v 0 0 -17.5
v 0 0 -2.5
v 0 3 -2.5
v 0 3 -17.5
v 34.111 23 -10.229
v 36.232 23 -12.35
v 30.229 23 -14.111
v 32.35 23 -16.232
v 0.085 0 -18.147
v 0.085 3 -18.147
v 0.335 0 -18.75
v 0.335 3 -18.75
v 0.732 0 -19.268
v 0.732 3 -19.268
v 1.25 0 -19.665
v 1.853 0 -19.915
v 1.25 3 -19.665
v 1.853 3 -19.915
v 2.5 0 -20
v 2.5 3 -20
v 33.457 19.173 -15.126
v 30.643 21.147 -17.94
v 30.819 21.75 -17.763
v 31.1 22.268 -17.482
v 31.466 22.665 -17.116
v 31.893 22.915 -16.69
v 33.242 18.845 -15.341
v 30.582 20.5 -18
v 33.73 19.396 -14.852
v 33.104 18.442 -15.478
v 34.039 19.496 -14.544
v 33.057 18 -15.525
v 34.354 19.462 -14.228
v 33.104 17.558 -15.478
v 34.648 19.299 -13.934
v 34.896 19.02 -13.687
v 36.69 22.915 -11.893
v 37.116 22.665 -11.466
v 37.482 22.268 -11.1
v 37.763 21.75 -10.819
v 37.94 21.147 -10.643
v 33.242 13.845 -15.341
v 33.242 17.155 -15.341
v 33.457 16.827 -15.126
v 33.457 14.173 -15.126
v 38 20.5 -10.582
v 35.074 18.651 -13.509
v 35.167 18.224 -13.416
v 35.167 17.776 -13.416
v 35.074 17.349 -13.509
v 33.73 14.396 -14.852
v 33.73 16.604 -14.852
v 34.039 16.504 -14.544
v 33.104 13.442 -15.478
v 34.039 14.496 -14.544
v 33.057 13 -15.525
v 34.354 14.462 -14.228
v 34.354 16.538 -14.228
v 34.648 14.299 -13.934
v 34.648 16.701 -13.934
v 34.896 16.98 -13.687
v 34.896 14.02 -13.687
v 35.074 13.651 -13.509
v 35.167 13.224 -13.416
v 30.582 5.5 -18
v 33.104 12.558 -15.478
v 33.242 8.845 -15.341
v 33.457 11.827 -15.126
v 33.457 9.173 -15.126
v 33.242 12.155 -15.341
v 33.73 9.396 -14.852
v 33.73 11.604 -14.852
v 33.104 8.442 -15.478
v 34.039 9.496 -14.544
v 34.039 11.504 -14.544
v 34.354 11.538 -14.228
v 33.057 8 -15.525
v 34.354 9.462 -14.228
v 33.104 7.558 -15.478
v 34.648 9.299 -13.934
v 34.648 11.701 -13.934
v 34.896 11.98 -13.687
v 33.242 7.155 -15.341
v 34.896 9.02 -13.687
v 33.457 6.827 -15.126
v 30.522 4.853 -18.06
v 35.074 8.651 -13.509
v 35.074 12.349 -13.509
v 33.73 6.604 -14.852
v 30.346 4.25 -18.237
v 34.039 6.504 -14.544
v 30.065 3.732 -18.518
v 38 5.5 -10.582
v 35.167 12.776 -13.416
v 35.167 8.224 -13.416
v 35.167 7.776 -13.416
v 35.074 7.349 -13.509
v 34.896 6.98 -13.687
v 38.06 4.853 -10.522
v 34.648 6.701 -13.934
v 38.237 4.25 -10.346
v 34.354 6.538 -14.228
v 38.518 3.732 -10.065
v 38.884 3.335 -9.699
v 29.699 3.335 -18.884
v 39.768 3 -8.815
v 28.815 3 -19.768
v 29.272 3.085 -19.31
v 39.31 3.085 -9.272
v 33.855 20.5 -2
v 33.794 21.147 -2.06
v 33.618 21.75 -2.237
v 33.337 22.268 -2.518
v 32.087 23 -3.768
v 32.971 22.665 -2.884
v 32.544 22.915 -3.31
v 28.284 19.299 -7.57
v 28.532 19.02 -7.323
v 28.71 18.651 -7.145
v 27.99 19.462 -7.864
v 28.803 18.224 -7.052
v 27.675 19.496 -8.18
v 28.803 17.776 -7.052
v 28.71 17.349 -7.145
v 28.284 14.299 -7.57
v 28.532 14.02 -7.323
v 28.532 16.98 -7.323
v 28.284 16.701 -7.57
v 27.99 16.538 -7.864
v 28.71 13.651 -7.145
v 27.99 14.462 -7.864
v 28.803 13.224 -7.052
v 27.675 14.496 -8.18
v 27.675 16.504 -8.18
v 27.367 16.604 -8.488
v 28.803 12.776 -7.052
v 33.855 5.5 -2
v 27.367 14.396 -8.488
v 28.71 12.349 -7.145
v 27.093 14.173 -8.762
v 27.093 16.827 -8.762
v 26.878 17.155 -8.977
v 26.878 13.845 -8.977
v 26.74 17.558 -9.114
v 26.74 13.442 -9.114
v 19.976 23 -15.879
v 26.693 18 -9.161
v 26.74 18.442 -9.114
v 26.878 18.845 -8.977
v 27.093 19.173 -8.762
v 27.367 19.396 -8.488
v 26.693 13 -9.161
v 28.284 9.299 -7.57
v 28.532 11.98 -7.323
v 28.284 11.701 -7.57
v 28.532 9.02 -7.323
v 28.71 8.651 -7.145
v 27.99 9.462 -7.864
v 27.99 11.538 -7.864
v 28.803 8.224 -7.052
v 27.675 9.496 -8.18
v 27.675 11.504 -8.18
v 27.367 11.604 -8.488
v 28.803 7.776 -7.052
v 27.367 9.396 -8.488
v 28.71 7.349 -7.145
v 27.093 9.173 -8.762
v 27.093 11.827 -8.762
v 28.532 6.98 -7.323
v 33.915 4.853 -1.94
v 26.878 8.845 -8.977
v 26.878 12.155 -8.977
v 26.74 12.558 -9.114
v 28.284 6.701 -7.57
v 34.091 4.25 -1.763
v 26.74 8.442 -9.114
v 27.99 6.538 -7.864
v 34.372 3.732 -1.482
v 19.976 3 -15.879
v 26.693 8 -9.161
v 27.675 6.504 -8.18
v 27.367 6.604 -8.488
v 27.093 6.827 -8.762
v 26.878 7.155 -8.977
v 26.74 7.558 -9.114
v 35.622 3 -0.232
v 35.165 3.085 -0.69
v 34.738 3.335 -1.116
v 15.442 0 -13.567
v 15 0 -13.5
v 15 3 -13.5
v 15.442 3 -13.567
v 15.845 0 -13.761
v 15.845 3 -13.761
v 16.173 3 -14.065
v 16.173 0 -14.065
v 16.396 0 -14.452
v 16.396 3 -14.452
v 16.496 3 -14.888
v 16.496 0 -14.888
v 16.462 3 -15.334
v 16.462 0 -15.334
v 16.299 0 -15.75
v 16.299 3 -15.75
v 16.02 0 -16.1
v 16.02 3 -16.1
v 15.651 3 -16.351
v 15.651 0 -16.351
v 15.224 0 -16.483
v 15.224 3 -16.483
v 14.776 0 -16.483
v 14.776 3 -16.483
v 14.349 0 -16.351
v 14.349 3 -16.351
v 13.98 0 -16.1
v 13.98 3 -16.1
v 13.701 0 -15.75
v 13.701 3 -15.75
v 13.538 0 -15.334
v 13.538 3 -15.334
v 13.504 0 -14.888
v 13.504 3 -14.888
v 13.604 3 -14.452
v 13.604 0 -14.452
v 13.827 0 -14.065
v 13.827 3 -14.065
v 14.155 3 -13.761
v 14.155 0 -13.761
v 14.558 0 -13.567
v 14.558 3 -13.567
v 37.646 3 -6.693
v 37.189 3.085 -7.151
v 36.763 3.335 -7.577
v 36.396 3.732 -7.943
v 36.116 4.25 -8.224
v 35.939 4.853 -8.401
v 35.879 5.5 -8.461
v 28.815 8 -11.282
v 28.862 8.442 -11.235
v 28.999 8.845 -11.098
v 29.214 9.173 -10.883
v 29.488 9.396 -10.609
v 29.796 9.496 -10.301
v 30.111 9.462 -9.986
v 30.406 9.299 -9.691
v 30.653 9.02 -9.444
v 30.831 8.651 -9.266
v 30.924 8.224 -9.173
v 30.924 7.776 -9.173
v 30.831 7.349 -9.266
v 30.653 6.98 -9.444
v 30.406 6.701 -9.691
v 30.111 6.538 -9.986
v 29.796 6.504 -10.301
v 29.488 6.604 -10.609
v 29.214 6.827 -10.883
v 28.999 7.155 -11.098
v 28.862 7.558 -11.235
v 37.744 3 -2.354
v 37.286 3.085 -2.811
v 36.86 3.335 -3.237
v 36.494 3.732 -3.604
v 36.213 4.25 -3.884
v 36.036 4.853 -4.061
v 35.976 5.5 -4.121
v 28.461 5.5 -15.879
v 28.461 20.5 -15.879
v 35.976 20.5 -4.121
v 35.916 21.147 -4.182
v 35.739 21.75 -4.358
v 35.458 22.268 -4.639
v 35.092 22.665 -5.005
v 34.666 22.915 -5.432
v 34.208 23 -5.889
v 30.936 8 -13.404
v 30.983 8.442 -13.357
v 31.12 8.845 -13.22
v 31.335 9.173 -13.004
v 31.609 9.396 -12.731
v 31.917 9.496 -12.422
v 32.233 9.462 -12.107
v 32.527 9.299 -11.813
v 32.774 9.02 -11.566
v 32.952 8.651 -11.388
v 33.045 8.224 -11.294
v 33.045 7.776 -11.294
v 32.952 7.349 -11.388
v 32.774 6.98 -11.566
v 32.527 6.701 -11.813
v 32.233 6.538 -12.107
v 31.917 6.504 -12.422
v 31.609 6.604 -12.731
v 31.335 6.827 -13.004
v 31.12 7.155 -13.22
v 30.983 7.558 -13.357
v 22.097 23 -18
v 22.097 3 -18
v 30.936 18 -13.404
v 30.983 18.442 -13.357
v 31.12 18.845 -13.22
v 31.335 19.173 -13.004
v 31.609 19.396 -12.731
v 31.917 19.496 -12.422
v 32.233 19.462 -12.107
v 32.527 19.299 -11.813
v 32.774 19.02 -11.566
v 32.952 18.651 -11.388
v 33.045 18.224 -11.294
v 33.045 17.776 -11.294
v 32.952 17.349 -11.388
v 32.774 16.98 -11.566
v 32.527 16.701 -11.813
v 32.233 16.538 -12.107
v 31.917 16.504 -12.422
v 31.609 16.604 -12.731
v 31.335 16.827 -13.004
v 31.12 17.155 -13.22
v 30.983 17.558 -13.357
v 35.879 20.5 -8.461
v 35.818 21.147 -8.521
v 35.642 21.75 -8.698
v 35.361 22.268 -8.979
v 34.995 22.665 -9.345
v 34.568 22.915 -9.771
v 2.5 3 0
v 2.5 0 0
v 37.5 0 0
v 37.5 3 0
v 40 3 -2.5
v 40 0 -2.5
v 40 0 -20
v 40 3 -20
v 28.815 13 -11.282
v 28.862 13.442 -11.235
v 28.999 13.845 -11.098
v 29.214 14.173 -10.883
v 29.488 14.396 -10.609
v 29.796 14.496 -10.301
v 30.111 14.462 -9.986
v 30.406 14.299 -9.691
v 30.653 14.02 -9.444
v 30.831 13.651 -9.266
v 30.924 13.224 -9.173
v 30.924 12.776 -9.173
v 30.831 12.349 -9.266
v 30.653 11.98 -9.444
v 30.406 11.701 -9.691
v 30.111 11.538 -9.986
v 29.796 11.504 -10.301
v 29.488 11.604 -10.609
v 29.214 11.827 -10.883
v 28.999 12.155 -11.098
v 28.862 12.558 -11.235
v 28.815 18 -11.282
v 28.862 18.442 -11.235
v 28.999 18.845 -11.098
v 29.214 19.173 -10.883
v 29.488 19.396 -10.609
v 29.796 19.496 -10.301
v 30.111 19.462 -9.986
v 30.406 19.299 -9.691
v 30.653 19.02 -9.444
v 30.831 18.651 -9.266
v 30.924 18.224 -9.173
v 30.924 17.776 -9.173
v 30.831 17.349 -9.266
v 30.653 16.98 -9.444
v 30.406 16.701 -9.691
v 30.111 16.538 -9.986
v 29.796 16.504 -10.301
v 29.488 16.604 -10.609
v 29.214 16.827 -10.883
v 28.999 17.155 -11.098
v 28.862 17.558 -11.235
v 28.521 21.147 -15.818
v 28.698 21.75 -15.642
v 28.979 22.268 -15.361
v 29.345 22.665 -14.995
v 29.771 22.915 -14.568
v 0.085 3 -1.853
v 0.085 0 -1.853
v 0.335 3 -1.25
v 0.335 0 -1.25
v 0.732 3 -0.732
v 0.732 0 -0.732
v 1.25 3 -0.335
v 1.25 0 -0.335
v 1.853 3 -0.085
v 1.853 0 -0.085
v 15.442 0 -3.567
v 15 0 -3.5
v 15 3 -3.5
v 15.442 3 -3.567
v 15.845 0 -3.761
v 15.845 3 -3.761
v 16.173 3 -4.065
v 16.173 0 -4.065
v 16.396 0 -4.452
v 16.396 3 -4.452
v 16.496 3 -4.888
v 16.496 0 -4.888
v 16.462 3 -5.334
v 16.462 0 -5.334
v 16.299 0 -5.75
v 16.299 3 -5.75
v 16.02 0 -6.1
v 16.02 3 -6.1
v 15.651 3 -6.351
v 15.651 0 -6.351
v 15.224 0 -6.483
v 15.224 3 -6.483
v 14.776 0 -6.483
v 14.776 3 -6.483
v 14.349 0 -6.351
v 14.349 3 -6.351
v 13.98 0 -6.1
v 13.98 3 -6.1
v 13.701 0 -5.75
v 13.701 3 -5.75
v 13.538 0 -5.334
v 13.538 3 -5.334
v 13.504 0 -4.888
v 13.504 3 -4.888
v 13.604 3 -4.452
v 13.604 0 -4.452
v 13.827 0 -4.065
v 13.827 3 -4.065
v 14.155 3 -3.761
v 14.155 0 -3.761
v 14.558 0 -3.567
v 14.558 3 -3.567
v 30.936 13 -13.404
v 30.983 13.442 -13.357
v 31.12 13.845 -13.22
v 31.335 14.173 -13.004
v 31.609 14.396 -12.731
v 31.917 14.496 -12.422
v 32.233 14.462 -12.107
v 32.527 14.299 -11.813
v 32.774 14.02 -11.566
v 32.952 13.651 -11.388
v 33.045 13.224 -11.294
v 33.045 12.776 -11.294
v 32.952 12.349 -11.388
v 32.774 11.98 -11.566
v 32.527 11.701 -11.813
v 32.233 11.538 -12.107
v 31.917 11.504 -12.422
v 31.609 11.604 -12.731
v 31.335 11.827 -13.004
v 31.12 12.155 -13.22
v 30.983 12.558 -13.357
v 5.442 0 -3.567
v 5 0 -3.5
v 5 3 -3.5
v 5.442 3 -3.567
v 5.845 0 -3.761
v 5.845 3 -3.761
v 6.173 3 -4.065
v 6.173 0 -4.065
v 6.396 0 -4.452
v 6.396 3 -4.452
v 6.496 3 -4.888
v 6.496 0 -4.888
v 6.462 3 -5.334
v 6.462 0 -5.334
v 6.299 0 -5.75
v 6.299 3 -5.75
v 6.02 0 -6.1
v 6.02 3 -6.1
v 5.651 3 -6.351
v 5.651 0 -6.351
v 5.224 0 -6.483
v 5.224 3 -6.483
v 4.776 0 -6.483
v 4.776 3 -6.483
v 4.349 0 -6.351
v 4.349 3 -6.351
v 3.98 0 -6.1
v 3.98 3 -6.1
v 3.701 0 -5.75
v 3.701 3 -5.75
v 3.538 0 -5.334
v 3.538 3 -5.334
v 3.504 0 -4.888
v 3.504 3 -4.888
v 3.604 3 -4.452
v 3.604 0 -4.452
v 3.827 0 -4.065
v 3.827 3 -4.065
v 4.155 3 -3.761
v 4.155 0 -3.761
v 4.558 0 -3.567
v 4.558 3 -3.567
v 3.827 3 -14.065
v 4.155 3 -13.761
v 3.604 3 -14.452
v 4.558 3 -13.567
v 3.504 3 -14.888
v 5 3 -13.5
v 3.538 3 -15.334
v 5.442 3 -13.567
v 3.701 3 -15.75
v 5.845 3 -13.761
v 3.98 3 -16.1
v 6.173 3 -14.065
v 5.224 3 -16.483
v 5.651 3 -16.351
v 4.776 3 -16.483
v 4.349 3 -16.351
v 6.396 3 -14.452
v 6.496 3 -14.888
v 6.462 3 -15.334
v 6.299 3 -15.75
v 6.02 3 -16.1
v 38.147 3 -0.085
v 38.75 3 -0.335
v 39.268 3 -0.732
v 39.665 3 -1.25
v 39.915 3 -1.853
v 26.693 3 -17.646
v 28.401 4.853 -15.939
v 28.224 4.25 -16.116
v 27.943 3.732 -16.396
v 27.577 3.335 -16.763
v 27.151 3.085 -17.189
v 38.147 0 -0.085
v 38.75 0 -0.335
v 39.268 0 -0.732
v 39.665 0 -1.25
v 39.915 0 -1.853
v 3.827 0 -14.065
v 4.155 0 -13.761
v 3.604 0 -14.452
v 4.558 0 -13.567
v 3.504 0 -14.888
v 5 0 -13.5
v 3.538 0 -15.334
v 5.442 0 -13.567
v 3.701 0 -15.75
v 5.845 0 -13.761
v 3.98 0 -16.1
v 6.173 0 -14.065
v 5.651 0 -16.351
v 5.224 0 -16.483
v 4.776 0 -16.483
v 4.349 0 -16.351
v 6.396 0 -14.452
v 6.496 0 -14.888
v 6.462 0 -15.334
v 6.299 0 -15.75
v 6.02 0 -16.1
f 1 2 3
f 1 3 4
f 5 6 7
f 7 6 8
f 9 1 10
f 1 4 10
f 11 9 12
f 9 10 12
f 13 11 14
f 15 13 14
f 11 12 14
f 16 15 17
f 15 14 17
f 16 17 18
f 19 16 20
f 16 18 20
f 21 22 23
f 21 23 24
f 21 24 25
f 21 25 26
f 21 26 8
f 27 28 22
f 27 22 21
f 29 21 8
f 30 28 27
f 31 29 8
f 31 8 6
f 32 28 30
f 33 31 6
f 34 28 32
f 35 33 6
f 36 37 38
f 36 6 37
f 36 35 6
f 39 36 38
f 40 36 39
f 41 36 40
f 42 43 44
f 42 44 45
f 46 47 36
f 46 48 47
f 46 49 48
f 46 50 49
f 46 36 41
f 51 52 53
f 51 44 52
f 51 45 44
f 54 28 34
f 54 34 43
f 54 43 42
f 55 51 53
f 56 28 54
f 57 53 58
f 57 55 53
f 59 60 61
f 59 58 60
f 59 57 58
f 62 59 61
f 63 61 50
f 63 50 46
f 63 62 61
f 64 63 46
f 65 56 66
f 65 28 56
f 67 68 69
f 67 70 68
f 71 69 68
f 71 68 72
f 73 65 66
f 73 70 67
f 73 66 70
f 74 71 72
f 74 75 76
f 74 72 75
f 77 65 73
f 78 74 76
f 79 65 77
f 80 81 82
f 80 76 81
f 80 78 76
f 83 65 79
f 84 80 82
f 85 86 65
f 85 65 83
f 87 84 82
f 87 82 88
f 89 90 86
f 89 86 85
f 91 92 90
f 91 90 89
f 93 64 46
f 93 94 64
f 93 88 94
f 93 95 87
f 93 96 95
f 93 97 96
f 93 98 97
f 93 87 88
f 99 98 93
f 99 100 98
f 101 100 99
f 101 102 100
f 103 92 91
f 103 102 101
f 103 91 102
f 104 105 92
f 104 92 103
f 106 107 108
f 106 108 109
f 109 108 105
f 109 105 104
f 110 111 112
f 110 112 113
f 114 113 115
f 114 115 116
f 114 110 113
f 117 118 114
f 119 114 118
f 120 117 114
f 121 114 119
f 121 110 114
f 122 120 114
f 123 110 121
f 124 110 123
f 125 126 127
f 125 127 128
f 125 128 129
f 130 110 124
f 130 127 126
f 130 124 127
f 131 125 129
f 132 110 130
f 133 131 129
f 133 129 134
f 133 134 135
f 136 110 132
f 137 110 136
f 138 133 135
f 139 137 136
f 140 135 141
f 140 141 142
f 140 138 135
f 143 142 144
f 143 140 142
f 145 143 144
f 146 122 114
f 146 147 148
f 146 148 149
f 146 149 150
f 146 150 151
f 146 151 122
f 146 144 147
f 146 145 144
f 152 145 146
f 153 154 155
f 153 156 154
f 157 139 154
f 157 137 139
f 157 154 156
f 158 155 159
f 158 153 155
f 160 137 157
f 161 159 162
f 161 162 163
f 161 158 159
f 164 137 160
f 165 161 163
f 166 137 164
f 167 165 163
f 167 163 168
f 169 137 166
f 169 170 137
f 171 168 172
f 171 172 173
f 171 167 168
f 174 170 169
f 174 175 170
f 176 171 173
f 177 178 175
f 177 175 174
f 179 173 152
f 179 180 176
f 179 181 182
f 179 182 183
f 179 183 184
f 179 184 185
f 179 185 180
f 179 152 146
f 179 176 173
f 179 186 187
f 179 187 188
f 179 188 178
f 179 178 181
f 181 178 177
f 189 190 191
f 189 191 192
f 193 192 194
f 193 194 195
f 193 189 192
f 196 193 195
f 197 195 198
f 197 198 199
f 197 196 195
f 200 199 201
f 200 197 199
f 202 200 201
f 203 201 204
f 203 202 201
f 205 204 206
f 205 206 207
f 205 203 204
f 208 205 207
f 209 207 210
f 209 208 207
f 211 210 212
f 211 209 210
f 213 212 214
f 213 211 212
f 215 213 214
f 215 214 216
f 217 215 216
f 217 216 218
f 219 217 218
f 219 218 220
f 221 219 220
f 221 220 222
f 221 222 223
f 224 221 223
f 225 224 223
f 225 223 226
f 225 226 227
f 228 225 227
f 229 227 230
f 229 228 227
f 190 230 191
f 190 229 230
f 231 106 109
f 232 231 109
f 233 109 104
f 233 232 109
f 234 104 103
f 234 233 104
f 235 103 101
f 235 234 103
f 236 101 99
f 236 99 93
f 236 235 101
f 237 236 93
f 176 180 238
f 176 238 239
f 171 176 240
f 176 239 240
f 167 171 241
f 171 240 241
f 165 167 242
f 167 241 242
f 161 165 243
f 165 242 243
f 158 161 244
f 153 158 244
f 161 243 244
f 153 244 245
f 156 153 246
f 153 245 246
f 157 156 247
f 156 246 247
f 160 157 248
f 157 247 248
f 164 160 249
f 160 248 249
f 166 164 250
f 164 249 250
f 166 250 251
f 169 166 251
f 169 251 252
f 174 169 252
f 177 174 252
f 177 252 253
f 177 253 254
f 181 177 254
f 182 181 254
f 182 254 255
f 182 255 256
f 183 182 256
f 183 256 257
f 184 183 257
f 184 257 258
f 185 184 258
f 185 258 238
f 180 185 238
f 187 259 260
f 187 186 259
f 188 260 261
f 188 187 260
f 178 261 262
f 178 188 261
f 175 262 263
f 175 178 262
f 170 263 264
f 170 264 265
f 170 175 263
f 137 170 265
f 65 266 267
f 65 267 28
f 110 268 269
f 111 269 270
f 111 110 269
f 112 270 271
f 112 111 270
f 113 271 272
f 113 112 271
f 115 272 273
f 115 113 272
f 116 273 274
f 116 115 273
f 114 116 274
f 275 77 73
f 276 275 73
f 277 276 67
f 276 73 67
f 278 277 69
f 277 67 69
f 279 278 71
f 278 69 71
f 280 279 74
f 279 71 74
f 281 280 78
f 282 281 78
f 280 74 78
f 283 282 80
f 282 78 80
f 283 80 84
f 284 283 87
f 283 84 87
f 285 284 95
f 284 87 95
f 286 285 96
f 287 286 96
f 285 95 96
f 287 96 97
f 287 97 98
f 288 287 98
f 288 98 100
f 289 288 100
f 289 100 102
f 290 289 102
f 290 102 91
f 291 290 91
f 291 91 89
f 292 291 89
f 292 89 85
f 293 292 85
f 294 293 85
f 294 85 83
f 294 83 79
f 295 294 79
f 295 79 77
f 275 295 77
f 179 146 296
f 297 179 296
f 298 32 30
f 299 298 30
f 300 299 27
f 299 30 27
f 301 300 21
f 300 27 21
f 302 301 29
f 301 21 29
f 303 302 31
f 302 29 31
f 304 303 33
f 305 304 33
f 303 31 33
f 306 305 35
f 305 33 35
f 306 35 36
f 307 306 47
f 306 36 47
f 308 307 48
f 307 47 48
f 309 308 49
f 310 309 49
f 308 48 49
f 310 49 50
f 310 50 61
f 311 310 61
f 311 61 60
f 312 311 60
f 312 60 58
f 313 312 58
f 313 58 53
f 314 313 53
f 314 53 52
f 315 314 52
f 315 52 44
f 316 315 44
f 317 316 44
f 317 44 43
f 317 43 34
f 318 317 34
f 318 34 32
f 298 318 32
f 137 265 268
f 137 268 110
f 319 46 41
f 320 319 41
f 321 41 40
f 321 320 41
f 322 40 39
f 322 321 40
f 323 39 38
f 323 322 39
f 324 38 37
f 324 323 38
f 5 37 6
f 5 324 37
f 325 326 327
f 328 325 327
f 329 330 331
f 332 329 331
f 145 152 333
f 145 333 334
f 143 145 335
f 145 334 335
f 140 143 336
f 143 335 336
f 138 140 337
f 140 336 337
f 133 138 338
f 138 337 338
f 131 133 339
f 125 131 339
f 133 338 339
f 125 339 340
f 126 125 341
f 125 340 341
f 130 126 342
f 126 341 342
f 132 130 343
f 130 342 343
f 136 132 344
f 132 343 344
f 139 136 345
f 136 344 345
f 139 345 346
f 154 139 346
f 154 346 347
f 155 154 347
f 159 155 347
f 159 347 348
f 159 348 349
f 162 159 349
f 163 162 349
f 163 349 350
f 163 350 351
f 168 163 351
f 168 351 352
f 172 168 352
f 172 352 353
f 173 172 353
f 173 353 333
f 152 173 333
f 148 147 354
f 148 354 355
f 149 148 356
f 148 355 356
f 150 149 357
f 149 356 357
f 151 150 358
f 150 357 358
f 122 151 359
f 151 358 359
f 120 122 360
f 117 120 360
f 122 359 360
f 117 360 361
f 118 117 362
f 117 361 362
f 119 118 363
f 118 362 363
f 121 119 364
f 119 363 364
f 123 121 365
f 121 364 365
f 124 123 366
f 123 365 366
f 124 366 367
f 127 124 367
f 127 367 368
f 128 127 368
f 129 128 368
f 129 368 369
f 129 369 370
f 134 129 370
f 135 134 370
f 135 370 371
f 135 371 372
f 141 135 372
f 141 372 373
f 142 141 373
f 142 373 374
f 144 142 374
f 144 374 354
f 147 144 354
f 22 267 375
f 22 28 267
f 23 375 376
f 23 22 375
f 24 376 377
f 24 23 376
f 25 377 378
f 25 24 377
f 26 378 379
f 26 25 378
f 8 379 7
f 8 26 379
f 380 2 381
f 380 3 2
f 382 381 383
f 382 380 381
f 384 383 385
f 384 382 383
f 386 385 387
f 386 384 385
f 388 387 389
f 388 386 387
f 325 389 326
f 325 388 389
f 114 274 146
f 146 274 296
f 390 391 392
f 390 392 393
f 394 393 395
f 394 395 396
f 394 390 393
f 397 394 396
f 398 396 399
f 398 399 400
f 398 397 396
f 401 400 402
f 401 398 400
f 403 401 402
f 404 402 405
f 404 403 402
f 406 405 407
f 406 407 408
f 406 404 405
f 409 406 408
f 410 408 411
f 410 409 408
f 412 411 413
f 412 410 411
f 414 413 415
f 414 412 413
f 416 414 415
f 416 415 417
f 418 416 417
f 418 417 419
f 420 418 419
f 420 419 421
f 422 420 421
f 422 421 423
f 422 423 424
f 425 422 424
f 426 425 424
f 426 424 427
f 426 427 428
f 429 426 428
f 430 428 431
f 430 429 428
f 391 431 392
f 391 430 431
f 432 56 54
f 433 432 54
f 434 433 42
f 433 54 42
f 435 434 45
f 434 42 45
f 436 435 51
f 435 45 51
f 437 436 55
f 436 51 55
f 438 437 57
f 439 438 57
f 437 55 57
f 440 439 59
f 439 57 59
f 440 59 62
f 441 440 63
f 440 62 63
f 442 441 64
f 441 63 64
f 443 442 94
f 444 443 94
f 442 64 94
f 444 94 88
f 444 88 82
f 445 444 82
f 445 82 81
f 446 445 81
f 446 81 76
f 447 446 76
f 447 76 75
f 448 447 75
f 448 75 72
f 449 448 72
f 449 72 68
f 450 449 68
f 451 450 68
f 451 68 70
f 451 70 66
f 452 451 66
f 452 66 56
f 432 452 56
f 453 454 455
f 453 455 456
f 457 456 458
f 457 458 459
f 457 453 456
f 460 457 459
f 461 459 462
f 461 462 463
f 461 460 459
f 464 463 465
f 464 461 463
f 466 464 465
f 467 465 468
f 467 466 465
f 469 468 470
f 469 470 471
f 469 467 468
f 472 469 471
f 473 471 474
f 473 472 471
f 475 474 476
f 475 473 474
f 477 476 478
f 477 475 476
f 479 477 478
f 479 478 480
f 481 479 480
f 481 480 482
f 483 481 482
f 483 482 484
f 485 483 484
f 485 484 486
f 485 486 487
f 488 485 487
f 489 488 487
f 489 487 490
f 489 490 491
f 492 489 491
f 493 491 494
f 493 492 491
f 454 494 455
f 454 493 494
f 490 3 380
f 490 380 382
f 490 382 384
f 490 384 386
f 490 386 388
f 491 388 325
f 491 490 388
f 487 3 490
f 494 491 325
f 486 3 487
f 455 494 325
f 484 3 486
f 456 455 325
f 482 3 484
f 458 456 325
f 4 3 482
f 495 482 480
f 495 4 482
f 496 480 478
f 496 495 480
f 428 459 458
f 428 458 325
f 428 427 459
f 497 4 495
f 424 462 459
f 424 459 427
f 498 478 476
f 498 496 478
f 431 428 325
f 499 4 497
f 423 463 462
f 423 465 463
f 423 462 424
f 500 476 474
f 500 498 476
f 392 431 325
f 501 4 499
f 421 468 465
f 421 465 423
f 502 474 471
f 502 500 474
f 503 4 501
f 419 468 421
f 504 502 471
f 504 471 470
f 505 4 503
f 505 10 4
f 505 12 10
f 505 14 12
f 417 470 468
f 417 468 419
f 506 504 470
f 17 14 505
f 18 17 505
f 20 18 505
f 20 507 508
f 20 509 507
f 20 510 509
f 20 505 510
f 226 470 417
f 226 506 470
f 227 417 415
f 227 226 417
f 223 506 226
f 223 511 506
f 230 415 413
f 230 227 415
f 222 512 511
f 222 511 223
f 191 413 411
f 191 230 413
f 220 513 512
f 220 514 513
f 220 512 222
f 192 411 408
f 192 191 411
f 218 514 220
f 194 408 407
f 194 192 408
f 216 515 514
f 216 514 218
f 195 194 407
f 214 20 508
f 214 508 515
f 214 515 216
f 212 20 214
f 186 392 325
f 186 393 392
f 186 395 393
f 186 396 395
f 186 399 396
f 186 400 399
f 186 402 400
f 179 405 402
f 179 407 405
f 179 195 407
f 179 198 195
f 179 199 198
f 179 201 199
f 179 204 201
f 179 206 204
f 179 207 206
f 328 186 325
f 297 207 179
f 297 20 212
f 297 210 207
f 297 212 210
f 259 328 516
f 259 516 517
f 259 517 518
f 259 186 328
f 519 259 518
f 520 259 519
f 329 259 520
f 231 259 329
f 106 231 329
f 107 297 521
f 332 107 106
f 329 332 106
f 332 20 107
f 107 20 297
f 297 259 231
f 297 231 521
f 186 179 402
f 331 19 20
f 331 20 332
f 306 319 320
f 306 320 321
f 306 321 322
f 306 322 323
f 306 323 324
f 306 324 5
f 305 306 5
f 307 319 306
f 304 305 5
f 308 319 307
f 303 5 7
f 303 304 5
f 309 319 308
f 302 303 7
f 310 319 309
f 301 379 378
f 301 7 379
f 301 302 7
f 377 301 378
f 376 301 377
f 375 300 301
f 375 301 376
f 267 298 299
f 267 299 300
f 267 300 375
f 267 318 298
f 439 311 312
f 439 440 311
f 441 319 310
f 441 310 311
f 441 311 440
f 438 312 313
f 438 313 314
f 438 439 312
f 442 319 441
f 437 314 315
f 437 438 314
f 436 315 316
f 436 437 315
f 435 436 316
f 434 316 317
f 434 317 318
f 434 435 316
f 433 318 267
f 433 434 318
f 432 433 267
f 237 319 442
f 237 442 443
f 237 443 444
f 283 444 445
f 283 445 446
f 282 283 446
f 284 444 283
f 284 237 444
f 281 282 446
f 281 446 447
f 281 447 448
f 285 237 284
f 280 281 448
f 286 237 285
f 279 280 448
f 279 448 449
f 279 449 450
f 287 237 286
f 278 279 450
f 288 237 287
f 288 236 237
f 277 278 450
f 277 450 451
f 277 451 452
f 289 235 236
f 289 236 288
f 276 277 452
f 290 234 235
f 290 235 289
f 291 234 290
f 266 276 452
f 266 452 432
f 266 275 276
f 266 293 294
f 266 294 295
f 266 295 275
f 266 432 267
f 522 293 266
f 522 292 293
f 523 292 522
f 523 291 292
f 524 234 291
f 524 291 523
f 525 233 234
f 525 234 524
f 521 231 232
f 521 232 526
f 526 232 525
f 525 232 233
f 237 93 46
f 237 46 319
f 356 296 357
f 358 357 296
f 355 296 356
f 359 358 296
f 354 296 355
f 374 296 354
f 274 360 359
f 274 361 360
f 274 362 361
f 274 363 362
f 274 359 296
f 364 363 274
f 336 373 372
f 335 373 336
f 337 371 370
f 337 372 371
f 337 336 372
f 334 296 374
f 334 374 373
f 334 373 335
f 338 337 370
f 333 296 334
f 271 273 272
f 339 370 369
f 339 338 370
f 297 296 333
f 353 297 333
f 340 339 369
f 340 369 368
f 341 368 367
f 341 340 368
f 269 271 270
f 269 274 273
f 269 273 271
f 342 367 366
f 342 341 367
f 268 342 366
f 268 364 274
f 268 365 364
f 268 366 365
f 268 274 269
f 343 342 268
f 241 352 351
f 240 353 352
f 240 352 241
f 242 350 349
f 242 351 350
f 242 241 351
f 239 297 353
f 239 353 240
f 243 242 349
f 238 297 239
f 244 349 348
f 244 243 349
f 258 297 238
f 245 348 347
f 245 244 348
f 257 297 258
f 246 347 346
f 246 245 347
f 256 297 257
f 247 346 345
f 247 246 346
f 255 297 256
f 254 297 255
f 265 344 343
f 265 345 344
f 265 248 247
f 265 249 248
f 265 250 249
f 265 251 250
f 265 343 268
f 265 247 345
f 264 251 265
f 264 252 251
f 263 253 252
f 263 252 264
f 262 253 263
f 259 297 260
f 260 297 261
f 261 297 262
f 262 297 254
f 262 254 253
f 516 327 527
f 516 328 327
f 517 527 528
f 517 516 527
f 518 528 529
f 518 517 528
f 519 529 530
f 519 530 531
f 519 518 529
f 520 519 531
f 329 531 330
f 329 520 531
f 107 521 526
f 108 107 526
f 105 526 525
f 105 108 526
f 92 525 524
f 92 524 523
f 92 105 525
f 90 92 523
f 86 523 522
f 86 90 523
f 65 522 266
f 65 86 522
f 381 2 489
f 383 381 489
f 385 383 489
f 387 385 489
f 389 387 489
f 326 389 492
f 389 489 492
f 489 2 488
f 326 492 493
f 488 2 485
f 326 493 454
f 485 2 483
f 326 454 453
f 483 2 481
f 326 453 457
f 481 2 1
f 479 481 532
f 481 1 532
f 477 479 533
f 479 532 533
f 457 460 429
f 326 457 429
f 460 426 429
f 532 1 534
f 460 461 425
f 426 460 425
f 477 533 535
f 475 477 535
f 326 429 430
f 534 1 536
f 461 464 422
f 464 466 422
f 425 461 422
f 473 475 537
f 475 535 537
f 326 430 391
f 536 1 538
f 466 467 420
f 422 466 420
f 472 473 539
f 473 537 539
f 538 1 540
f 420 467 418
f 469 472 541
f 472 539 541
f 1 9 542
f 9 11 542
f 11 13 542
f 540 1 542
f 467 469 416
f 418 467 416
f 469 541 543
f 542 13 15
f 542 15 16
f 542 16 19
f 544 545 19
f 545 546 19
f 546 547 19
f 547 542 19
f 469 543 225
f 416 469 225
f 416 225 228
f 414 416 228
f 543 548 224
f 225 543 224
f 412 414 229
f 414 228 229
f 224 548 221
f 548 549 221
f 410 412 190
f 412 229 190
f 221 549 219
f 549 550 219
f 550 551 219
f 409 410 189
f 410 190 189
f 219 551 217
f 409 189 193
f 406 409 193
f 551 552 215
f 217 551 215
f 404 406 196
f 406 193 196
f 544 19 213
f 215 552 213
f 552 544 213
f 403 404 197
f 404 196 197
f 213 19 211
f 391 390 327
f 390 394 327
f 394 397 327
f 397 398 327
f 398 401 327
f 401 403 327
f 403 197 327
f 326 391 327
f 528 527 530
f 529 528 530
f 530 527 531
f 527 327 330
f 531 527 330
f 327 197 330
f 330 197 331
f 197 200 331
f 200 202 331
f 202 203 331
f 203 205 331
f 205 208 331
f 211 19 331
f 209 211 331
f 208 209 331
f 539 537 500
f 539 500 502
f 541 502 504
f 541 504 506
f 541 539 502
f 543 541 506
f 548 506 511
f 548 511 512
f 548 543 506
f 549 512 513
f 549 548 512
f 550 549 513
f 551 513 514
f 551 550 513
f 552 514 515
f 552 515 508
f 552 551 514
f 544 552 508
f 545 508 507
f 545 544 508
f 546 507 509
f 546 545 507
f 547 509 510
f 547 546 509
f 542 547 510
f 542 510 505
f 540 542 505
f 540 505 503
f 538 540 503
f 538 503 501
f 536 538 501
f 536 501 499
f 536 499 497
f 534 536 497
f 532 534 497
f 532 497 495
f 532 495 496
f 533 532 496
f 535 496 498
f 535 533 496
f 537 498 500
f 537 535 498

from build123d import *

# Parameters (mm, degrees)
SKETCH2_W           = 40
SKETCH2_H           = 20
SKETCH2_R           = 1.5
BOSS_EXTRUDE1_DEPTH = 3
BOSS_EXTRUDE2_DEPTH = 20
SKETCH4_R           = 1.5
CUT_EXTRUDE1_DEPTH  = 20
FILLET2_R           = 2.5


with BuildPart() as part:
    # Sketch2 → Boss-Extrude1 (new body)
    with BuildSketch(Plane(origin=(0, 0, 0), x_dir=(1, 0, 0), z_dir=(0, 1, 0))):
        with Locations((20, 10)):
            Rectangle(SKETCH2_W, SKETCH2_H)
        with Locations(Location((5, 5, 0), (0, 0, 270))):
            Circle(SKETCH2_R, mode=Mode.SUBTRACT)
        with Locations(Location((15, 5, 0), (0, 0, 270))):
            Circle(SKETCH2_R, mode=Mode.SUBTRACT)
        with Locations(Location((15, 15, 0), (0, 0, 270))):
            Circle(SKETCH2_R, mode=Mode.SUBTRACT)
        with Locations(Location((5, 15, 0), (0, 0, 270))):
            Circle(SKETCH2_R, mode=Mode.SUBTRACT)
    extrude(amount=BOSS_EXTRUDE1_DEPTH)

    # Sketch3 → Boss-Extrude2 (add)
    with BuildSketch(Plane(origin=(0, 3, 0), x_dir=(1, 0, 0), z_dir=(0, 1, 0))):
        Polygon((22.097168491, 18), (35.975848148, 4.121320344), (33.854527804, 2), (19.975848148, 15.878679656), align=None)
        Polygon((35.878679656, 8.461129522), (28.461129522, 15.878679656), (30.582449865, 18), (38, 10.582449865), align=None)
    extrude(amount=BOSS_EXTRUDE2_DEPTH)

    # Sketch4 → Cut-Extrude1 (cut)
    with BuildSketch(Plane(origin=(24.291224933, 0, -24.291224933), x_dir=(-0.7071067811865372, 0, -0.7071067811865579), z_dir=(0.7071067811865579, 0, -0.7071067811865372))):
        with Locations((-13.897135624, 18)):
            Circle(SKETCH4_R)
        with Locations((-13.897135624, 13)):
            Circle(SKETCH4_R)
        with Locations((-13.897135624, 8)):
            Circle(SKETCH4_R)
    extrude(amount=-CUT_EXTRUDE1_DEPTH, mode=Mode.SUBTRACT)

    # Fillet2
    fillet2_edges = [part.edges().sort_by_distance(p)[0] for p in [
        (34.915187976, 3, -3.060660172),
        (34.915187976, 23, -3.060660172),
        (36.939339828, 3, -9.521789694),
        (29.521789694, 3, -16.939339828),
        (36.939339828, 23, -9.521789694),
        (29.521789694, 23, -16.939339828),
        (0, 1.5, -20),
        (40, 1.5, 0),
        (0, 1.5, 0),
    ]]
    fillet(fillet2_edges, radius=FILLET2_R)


solid = part.part
